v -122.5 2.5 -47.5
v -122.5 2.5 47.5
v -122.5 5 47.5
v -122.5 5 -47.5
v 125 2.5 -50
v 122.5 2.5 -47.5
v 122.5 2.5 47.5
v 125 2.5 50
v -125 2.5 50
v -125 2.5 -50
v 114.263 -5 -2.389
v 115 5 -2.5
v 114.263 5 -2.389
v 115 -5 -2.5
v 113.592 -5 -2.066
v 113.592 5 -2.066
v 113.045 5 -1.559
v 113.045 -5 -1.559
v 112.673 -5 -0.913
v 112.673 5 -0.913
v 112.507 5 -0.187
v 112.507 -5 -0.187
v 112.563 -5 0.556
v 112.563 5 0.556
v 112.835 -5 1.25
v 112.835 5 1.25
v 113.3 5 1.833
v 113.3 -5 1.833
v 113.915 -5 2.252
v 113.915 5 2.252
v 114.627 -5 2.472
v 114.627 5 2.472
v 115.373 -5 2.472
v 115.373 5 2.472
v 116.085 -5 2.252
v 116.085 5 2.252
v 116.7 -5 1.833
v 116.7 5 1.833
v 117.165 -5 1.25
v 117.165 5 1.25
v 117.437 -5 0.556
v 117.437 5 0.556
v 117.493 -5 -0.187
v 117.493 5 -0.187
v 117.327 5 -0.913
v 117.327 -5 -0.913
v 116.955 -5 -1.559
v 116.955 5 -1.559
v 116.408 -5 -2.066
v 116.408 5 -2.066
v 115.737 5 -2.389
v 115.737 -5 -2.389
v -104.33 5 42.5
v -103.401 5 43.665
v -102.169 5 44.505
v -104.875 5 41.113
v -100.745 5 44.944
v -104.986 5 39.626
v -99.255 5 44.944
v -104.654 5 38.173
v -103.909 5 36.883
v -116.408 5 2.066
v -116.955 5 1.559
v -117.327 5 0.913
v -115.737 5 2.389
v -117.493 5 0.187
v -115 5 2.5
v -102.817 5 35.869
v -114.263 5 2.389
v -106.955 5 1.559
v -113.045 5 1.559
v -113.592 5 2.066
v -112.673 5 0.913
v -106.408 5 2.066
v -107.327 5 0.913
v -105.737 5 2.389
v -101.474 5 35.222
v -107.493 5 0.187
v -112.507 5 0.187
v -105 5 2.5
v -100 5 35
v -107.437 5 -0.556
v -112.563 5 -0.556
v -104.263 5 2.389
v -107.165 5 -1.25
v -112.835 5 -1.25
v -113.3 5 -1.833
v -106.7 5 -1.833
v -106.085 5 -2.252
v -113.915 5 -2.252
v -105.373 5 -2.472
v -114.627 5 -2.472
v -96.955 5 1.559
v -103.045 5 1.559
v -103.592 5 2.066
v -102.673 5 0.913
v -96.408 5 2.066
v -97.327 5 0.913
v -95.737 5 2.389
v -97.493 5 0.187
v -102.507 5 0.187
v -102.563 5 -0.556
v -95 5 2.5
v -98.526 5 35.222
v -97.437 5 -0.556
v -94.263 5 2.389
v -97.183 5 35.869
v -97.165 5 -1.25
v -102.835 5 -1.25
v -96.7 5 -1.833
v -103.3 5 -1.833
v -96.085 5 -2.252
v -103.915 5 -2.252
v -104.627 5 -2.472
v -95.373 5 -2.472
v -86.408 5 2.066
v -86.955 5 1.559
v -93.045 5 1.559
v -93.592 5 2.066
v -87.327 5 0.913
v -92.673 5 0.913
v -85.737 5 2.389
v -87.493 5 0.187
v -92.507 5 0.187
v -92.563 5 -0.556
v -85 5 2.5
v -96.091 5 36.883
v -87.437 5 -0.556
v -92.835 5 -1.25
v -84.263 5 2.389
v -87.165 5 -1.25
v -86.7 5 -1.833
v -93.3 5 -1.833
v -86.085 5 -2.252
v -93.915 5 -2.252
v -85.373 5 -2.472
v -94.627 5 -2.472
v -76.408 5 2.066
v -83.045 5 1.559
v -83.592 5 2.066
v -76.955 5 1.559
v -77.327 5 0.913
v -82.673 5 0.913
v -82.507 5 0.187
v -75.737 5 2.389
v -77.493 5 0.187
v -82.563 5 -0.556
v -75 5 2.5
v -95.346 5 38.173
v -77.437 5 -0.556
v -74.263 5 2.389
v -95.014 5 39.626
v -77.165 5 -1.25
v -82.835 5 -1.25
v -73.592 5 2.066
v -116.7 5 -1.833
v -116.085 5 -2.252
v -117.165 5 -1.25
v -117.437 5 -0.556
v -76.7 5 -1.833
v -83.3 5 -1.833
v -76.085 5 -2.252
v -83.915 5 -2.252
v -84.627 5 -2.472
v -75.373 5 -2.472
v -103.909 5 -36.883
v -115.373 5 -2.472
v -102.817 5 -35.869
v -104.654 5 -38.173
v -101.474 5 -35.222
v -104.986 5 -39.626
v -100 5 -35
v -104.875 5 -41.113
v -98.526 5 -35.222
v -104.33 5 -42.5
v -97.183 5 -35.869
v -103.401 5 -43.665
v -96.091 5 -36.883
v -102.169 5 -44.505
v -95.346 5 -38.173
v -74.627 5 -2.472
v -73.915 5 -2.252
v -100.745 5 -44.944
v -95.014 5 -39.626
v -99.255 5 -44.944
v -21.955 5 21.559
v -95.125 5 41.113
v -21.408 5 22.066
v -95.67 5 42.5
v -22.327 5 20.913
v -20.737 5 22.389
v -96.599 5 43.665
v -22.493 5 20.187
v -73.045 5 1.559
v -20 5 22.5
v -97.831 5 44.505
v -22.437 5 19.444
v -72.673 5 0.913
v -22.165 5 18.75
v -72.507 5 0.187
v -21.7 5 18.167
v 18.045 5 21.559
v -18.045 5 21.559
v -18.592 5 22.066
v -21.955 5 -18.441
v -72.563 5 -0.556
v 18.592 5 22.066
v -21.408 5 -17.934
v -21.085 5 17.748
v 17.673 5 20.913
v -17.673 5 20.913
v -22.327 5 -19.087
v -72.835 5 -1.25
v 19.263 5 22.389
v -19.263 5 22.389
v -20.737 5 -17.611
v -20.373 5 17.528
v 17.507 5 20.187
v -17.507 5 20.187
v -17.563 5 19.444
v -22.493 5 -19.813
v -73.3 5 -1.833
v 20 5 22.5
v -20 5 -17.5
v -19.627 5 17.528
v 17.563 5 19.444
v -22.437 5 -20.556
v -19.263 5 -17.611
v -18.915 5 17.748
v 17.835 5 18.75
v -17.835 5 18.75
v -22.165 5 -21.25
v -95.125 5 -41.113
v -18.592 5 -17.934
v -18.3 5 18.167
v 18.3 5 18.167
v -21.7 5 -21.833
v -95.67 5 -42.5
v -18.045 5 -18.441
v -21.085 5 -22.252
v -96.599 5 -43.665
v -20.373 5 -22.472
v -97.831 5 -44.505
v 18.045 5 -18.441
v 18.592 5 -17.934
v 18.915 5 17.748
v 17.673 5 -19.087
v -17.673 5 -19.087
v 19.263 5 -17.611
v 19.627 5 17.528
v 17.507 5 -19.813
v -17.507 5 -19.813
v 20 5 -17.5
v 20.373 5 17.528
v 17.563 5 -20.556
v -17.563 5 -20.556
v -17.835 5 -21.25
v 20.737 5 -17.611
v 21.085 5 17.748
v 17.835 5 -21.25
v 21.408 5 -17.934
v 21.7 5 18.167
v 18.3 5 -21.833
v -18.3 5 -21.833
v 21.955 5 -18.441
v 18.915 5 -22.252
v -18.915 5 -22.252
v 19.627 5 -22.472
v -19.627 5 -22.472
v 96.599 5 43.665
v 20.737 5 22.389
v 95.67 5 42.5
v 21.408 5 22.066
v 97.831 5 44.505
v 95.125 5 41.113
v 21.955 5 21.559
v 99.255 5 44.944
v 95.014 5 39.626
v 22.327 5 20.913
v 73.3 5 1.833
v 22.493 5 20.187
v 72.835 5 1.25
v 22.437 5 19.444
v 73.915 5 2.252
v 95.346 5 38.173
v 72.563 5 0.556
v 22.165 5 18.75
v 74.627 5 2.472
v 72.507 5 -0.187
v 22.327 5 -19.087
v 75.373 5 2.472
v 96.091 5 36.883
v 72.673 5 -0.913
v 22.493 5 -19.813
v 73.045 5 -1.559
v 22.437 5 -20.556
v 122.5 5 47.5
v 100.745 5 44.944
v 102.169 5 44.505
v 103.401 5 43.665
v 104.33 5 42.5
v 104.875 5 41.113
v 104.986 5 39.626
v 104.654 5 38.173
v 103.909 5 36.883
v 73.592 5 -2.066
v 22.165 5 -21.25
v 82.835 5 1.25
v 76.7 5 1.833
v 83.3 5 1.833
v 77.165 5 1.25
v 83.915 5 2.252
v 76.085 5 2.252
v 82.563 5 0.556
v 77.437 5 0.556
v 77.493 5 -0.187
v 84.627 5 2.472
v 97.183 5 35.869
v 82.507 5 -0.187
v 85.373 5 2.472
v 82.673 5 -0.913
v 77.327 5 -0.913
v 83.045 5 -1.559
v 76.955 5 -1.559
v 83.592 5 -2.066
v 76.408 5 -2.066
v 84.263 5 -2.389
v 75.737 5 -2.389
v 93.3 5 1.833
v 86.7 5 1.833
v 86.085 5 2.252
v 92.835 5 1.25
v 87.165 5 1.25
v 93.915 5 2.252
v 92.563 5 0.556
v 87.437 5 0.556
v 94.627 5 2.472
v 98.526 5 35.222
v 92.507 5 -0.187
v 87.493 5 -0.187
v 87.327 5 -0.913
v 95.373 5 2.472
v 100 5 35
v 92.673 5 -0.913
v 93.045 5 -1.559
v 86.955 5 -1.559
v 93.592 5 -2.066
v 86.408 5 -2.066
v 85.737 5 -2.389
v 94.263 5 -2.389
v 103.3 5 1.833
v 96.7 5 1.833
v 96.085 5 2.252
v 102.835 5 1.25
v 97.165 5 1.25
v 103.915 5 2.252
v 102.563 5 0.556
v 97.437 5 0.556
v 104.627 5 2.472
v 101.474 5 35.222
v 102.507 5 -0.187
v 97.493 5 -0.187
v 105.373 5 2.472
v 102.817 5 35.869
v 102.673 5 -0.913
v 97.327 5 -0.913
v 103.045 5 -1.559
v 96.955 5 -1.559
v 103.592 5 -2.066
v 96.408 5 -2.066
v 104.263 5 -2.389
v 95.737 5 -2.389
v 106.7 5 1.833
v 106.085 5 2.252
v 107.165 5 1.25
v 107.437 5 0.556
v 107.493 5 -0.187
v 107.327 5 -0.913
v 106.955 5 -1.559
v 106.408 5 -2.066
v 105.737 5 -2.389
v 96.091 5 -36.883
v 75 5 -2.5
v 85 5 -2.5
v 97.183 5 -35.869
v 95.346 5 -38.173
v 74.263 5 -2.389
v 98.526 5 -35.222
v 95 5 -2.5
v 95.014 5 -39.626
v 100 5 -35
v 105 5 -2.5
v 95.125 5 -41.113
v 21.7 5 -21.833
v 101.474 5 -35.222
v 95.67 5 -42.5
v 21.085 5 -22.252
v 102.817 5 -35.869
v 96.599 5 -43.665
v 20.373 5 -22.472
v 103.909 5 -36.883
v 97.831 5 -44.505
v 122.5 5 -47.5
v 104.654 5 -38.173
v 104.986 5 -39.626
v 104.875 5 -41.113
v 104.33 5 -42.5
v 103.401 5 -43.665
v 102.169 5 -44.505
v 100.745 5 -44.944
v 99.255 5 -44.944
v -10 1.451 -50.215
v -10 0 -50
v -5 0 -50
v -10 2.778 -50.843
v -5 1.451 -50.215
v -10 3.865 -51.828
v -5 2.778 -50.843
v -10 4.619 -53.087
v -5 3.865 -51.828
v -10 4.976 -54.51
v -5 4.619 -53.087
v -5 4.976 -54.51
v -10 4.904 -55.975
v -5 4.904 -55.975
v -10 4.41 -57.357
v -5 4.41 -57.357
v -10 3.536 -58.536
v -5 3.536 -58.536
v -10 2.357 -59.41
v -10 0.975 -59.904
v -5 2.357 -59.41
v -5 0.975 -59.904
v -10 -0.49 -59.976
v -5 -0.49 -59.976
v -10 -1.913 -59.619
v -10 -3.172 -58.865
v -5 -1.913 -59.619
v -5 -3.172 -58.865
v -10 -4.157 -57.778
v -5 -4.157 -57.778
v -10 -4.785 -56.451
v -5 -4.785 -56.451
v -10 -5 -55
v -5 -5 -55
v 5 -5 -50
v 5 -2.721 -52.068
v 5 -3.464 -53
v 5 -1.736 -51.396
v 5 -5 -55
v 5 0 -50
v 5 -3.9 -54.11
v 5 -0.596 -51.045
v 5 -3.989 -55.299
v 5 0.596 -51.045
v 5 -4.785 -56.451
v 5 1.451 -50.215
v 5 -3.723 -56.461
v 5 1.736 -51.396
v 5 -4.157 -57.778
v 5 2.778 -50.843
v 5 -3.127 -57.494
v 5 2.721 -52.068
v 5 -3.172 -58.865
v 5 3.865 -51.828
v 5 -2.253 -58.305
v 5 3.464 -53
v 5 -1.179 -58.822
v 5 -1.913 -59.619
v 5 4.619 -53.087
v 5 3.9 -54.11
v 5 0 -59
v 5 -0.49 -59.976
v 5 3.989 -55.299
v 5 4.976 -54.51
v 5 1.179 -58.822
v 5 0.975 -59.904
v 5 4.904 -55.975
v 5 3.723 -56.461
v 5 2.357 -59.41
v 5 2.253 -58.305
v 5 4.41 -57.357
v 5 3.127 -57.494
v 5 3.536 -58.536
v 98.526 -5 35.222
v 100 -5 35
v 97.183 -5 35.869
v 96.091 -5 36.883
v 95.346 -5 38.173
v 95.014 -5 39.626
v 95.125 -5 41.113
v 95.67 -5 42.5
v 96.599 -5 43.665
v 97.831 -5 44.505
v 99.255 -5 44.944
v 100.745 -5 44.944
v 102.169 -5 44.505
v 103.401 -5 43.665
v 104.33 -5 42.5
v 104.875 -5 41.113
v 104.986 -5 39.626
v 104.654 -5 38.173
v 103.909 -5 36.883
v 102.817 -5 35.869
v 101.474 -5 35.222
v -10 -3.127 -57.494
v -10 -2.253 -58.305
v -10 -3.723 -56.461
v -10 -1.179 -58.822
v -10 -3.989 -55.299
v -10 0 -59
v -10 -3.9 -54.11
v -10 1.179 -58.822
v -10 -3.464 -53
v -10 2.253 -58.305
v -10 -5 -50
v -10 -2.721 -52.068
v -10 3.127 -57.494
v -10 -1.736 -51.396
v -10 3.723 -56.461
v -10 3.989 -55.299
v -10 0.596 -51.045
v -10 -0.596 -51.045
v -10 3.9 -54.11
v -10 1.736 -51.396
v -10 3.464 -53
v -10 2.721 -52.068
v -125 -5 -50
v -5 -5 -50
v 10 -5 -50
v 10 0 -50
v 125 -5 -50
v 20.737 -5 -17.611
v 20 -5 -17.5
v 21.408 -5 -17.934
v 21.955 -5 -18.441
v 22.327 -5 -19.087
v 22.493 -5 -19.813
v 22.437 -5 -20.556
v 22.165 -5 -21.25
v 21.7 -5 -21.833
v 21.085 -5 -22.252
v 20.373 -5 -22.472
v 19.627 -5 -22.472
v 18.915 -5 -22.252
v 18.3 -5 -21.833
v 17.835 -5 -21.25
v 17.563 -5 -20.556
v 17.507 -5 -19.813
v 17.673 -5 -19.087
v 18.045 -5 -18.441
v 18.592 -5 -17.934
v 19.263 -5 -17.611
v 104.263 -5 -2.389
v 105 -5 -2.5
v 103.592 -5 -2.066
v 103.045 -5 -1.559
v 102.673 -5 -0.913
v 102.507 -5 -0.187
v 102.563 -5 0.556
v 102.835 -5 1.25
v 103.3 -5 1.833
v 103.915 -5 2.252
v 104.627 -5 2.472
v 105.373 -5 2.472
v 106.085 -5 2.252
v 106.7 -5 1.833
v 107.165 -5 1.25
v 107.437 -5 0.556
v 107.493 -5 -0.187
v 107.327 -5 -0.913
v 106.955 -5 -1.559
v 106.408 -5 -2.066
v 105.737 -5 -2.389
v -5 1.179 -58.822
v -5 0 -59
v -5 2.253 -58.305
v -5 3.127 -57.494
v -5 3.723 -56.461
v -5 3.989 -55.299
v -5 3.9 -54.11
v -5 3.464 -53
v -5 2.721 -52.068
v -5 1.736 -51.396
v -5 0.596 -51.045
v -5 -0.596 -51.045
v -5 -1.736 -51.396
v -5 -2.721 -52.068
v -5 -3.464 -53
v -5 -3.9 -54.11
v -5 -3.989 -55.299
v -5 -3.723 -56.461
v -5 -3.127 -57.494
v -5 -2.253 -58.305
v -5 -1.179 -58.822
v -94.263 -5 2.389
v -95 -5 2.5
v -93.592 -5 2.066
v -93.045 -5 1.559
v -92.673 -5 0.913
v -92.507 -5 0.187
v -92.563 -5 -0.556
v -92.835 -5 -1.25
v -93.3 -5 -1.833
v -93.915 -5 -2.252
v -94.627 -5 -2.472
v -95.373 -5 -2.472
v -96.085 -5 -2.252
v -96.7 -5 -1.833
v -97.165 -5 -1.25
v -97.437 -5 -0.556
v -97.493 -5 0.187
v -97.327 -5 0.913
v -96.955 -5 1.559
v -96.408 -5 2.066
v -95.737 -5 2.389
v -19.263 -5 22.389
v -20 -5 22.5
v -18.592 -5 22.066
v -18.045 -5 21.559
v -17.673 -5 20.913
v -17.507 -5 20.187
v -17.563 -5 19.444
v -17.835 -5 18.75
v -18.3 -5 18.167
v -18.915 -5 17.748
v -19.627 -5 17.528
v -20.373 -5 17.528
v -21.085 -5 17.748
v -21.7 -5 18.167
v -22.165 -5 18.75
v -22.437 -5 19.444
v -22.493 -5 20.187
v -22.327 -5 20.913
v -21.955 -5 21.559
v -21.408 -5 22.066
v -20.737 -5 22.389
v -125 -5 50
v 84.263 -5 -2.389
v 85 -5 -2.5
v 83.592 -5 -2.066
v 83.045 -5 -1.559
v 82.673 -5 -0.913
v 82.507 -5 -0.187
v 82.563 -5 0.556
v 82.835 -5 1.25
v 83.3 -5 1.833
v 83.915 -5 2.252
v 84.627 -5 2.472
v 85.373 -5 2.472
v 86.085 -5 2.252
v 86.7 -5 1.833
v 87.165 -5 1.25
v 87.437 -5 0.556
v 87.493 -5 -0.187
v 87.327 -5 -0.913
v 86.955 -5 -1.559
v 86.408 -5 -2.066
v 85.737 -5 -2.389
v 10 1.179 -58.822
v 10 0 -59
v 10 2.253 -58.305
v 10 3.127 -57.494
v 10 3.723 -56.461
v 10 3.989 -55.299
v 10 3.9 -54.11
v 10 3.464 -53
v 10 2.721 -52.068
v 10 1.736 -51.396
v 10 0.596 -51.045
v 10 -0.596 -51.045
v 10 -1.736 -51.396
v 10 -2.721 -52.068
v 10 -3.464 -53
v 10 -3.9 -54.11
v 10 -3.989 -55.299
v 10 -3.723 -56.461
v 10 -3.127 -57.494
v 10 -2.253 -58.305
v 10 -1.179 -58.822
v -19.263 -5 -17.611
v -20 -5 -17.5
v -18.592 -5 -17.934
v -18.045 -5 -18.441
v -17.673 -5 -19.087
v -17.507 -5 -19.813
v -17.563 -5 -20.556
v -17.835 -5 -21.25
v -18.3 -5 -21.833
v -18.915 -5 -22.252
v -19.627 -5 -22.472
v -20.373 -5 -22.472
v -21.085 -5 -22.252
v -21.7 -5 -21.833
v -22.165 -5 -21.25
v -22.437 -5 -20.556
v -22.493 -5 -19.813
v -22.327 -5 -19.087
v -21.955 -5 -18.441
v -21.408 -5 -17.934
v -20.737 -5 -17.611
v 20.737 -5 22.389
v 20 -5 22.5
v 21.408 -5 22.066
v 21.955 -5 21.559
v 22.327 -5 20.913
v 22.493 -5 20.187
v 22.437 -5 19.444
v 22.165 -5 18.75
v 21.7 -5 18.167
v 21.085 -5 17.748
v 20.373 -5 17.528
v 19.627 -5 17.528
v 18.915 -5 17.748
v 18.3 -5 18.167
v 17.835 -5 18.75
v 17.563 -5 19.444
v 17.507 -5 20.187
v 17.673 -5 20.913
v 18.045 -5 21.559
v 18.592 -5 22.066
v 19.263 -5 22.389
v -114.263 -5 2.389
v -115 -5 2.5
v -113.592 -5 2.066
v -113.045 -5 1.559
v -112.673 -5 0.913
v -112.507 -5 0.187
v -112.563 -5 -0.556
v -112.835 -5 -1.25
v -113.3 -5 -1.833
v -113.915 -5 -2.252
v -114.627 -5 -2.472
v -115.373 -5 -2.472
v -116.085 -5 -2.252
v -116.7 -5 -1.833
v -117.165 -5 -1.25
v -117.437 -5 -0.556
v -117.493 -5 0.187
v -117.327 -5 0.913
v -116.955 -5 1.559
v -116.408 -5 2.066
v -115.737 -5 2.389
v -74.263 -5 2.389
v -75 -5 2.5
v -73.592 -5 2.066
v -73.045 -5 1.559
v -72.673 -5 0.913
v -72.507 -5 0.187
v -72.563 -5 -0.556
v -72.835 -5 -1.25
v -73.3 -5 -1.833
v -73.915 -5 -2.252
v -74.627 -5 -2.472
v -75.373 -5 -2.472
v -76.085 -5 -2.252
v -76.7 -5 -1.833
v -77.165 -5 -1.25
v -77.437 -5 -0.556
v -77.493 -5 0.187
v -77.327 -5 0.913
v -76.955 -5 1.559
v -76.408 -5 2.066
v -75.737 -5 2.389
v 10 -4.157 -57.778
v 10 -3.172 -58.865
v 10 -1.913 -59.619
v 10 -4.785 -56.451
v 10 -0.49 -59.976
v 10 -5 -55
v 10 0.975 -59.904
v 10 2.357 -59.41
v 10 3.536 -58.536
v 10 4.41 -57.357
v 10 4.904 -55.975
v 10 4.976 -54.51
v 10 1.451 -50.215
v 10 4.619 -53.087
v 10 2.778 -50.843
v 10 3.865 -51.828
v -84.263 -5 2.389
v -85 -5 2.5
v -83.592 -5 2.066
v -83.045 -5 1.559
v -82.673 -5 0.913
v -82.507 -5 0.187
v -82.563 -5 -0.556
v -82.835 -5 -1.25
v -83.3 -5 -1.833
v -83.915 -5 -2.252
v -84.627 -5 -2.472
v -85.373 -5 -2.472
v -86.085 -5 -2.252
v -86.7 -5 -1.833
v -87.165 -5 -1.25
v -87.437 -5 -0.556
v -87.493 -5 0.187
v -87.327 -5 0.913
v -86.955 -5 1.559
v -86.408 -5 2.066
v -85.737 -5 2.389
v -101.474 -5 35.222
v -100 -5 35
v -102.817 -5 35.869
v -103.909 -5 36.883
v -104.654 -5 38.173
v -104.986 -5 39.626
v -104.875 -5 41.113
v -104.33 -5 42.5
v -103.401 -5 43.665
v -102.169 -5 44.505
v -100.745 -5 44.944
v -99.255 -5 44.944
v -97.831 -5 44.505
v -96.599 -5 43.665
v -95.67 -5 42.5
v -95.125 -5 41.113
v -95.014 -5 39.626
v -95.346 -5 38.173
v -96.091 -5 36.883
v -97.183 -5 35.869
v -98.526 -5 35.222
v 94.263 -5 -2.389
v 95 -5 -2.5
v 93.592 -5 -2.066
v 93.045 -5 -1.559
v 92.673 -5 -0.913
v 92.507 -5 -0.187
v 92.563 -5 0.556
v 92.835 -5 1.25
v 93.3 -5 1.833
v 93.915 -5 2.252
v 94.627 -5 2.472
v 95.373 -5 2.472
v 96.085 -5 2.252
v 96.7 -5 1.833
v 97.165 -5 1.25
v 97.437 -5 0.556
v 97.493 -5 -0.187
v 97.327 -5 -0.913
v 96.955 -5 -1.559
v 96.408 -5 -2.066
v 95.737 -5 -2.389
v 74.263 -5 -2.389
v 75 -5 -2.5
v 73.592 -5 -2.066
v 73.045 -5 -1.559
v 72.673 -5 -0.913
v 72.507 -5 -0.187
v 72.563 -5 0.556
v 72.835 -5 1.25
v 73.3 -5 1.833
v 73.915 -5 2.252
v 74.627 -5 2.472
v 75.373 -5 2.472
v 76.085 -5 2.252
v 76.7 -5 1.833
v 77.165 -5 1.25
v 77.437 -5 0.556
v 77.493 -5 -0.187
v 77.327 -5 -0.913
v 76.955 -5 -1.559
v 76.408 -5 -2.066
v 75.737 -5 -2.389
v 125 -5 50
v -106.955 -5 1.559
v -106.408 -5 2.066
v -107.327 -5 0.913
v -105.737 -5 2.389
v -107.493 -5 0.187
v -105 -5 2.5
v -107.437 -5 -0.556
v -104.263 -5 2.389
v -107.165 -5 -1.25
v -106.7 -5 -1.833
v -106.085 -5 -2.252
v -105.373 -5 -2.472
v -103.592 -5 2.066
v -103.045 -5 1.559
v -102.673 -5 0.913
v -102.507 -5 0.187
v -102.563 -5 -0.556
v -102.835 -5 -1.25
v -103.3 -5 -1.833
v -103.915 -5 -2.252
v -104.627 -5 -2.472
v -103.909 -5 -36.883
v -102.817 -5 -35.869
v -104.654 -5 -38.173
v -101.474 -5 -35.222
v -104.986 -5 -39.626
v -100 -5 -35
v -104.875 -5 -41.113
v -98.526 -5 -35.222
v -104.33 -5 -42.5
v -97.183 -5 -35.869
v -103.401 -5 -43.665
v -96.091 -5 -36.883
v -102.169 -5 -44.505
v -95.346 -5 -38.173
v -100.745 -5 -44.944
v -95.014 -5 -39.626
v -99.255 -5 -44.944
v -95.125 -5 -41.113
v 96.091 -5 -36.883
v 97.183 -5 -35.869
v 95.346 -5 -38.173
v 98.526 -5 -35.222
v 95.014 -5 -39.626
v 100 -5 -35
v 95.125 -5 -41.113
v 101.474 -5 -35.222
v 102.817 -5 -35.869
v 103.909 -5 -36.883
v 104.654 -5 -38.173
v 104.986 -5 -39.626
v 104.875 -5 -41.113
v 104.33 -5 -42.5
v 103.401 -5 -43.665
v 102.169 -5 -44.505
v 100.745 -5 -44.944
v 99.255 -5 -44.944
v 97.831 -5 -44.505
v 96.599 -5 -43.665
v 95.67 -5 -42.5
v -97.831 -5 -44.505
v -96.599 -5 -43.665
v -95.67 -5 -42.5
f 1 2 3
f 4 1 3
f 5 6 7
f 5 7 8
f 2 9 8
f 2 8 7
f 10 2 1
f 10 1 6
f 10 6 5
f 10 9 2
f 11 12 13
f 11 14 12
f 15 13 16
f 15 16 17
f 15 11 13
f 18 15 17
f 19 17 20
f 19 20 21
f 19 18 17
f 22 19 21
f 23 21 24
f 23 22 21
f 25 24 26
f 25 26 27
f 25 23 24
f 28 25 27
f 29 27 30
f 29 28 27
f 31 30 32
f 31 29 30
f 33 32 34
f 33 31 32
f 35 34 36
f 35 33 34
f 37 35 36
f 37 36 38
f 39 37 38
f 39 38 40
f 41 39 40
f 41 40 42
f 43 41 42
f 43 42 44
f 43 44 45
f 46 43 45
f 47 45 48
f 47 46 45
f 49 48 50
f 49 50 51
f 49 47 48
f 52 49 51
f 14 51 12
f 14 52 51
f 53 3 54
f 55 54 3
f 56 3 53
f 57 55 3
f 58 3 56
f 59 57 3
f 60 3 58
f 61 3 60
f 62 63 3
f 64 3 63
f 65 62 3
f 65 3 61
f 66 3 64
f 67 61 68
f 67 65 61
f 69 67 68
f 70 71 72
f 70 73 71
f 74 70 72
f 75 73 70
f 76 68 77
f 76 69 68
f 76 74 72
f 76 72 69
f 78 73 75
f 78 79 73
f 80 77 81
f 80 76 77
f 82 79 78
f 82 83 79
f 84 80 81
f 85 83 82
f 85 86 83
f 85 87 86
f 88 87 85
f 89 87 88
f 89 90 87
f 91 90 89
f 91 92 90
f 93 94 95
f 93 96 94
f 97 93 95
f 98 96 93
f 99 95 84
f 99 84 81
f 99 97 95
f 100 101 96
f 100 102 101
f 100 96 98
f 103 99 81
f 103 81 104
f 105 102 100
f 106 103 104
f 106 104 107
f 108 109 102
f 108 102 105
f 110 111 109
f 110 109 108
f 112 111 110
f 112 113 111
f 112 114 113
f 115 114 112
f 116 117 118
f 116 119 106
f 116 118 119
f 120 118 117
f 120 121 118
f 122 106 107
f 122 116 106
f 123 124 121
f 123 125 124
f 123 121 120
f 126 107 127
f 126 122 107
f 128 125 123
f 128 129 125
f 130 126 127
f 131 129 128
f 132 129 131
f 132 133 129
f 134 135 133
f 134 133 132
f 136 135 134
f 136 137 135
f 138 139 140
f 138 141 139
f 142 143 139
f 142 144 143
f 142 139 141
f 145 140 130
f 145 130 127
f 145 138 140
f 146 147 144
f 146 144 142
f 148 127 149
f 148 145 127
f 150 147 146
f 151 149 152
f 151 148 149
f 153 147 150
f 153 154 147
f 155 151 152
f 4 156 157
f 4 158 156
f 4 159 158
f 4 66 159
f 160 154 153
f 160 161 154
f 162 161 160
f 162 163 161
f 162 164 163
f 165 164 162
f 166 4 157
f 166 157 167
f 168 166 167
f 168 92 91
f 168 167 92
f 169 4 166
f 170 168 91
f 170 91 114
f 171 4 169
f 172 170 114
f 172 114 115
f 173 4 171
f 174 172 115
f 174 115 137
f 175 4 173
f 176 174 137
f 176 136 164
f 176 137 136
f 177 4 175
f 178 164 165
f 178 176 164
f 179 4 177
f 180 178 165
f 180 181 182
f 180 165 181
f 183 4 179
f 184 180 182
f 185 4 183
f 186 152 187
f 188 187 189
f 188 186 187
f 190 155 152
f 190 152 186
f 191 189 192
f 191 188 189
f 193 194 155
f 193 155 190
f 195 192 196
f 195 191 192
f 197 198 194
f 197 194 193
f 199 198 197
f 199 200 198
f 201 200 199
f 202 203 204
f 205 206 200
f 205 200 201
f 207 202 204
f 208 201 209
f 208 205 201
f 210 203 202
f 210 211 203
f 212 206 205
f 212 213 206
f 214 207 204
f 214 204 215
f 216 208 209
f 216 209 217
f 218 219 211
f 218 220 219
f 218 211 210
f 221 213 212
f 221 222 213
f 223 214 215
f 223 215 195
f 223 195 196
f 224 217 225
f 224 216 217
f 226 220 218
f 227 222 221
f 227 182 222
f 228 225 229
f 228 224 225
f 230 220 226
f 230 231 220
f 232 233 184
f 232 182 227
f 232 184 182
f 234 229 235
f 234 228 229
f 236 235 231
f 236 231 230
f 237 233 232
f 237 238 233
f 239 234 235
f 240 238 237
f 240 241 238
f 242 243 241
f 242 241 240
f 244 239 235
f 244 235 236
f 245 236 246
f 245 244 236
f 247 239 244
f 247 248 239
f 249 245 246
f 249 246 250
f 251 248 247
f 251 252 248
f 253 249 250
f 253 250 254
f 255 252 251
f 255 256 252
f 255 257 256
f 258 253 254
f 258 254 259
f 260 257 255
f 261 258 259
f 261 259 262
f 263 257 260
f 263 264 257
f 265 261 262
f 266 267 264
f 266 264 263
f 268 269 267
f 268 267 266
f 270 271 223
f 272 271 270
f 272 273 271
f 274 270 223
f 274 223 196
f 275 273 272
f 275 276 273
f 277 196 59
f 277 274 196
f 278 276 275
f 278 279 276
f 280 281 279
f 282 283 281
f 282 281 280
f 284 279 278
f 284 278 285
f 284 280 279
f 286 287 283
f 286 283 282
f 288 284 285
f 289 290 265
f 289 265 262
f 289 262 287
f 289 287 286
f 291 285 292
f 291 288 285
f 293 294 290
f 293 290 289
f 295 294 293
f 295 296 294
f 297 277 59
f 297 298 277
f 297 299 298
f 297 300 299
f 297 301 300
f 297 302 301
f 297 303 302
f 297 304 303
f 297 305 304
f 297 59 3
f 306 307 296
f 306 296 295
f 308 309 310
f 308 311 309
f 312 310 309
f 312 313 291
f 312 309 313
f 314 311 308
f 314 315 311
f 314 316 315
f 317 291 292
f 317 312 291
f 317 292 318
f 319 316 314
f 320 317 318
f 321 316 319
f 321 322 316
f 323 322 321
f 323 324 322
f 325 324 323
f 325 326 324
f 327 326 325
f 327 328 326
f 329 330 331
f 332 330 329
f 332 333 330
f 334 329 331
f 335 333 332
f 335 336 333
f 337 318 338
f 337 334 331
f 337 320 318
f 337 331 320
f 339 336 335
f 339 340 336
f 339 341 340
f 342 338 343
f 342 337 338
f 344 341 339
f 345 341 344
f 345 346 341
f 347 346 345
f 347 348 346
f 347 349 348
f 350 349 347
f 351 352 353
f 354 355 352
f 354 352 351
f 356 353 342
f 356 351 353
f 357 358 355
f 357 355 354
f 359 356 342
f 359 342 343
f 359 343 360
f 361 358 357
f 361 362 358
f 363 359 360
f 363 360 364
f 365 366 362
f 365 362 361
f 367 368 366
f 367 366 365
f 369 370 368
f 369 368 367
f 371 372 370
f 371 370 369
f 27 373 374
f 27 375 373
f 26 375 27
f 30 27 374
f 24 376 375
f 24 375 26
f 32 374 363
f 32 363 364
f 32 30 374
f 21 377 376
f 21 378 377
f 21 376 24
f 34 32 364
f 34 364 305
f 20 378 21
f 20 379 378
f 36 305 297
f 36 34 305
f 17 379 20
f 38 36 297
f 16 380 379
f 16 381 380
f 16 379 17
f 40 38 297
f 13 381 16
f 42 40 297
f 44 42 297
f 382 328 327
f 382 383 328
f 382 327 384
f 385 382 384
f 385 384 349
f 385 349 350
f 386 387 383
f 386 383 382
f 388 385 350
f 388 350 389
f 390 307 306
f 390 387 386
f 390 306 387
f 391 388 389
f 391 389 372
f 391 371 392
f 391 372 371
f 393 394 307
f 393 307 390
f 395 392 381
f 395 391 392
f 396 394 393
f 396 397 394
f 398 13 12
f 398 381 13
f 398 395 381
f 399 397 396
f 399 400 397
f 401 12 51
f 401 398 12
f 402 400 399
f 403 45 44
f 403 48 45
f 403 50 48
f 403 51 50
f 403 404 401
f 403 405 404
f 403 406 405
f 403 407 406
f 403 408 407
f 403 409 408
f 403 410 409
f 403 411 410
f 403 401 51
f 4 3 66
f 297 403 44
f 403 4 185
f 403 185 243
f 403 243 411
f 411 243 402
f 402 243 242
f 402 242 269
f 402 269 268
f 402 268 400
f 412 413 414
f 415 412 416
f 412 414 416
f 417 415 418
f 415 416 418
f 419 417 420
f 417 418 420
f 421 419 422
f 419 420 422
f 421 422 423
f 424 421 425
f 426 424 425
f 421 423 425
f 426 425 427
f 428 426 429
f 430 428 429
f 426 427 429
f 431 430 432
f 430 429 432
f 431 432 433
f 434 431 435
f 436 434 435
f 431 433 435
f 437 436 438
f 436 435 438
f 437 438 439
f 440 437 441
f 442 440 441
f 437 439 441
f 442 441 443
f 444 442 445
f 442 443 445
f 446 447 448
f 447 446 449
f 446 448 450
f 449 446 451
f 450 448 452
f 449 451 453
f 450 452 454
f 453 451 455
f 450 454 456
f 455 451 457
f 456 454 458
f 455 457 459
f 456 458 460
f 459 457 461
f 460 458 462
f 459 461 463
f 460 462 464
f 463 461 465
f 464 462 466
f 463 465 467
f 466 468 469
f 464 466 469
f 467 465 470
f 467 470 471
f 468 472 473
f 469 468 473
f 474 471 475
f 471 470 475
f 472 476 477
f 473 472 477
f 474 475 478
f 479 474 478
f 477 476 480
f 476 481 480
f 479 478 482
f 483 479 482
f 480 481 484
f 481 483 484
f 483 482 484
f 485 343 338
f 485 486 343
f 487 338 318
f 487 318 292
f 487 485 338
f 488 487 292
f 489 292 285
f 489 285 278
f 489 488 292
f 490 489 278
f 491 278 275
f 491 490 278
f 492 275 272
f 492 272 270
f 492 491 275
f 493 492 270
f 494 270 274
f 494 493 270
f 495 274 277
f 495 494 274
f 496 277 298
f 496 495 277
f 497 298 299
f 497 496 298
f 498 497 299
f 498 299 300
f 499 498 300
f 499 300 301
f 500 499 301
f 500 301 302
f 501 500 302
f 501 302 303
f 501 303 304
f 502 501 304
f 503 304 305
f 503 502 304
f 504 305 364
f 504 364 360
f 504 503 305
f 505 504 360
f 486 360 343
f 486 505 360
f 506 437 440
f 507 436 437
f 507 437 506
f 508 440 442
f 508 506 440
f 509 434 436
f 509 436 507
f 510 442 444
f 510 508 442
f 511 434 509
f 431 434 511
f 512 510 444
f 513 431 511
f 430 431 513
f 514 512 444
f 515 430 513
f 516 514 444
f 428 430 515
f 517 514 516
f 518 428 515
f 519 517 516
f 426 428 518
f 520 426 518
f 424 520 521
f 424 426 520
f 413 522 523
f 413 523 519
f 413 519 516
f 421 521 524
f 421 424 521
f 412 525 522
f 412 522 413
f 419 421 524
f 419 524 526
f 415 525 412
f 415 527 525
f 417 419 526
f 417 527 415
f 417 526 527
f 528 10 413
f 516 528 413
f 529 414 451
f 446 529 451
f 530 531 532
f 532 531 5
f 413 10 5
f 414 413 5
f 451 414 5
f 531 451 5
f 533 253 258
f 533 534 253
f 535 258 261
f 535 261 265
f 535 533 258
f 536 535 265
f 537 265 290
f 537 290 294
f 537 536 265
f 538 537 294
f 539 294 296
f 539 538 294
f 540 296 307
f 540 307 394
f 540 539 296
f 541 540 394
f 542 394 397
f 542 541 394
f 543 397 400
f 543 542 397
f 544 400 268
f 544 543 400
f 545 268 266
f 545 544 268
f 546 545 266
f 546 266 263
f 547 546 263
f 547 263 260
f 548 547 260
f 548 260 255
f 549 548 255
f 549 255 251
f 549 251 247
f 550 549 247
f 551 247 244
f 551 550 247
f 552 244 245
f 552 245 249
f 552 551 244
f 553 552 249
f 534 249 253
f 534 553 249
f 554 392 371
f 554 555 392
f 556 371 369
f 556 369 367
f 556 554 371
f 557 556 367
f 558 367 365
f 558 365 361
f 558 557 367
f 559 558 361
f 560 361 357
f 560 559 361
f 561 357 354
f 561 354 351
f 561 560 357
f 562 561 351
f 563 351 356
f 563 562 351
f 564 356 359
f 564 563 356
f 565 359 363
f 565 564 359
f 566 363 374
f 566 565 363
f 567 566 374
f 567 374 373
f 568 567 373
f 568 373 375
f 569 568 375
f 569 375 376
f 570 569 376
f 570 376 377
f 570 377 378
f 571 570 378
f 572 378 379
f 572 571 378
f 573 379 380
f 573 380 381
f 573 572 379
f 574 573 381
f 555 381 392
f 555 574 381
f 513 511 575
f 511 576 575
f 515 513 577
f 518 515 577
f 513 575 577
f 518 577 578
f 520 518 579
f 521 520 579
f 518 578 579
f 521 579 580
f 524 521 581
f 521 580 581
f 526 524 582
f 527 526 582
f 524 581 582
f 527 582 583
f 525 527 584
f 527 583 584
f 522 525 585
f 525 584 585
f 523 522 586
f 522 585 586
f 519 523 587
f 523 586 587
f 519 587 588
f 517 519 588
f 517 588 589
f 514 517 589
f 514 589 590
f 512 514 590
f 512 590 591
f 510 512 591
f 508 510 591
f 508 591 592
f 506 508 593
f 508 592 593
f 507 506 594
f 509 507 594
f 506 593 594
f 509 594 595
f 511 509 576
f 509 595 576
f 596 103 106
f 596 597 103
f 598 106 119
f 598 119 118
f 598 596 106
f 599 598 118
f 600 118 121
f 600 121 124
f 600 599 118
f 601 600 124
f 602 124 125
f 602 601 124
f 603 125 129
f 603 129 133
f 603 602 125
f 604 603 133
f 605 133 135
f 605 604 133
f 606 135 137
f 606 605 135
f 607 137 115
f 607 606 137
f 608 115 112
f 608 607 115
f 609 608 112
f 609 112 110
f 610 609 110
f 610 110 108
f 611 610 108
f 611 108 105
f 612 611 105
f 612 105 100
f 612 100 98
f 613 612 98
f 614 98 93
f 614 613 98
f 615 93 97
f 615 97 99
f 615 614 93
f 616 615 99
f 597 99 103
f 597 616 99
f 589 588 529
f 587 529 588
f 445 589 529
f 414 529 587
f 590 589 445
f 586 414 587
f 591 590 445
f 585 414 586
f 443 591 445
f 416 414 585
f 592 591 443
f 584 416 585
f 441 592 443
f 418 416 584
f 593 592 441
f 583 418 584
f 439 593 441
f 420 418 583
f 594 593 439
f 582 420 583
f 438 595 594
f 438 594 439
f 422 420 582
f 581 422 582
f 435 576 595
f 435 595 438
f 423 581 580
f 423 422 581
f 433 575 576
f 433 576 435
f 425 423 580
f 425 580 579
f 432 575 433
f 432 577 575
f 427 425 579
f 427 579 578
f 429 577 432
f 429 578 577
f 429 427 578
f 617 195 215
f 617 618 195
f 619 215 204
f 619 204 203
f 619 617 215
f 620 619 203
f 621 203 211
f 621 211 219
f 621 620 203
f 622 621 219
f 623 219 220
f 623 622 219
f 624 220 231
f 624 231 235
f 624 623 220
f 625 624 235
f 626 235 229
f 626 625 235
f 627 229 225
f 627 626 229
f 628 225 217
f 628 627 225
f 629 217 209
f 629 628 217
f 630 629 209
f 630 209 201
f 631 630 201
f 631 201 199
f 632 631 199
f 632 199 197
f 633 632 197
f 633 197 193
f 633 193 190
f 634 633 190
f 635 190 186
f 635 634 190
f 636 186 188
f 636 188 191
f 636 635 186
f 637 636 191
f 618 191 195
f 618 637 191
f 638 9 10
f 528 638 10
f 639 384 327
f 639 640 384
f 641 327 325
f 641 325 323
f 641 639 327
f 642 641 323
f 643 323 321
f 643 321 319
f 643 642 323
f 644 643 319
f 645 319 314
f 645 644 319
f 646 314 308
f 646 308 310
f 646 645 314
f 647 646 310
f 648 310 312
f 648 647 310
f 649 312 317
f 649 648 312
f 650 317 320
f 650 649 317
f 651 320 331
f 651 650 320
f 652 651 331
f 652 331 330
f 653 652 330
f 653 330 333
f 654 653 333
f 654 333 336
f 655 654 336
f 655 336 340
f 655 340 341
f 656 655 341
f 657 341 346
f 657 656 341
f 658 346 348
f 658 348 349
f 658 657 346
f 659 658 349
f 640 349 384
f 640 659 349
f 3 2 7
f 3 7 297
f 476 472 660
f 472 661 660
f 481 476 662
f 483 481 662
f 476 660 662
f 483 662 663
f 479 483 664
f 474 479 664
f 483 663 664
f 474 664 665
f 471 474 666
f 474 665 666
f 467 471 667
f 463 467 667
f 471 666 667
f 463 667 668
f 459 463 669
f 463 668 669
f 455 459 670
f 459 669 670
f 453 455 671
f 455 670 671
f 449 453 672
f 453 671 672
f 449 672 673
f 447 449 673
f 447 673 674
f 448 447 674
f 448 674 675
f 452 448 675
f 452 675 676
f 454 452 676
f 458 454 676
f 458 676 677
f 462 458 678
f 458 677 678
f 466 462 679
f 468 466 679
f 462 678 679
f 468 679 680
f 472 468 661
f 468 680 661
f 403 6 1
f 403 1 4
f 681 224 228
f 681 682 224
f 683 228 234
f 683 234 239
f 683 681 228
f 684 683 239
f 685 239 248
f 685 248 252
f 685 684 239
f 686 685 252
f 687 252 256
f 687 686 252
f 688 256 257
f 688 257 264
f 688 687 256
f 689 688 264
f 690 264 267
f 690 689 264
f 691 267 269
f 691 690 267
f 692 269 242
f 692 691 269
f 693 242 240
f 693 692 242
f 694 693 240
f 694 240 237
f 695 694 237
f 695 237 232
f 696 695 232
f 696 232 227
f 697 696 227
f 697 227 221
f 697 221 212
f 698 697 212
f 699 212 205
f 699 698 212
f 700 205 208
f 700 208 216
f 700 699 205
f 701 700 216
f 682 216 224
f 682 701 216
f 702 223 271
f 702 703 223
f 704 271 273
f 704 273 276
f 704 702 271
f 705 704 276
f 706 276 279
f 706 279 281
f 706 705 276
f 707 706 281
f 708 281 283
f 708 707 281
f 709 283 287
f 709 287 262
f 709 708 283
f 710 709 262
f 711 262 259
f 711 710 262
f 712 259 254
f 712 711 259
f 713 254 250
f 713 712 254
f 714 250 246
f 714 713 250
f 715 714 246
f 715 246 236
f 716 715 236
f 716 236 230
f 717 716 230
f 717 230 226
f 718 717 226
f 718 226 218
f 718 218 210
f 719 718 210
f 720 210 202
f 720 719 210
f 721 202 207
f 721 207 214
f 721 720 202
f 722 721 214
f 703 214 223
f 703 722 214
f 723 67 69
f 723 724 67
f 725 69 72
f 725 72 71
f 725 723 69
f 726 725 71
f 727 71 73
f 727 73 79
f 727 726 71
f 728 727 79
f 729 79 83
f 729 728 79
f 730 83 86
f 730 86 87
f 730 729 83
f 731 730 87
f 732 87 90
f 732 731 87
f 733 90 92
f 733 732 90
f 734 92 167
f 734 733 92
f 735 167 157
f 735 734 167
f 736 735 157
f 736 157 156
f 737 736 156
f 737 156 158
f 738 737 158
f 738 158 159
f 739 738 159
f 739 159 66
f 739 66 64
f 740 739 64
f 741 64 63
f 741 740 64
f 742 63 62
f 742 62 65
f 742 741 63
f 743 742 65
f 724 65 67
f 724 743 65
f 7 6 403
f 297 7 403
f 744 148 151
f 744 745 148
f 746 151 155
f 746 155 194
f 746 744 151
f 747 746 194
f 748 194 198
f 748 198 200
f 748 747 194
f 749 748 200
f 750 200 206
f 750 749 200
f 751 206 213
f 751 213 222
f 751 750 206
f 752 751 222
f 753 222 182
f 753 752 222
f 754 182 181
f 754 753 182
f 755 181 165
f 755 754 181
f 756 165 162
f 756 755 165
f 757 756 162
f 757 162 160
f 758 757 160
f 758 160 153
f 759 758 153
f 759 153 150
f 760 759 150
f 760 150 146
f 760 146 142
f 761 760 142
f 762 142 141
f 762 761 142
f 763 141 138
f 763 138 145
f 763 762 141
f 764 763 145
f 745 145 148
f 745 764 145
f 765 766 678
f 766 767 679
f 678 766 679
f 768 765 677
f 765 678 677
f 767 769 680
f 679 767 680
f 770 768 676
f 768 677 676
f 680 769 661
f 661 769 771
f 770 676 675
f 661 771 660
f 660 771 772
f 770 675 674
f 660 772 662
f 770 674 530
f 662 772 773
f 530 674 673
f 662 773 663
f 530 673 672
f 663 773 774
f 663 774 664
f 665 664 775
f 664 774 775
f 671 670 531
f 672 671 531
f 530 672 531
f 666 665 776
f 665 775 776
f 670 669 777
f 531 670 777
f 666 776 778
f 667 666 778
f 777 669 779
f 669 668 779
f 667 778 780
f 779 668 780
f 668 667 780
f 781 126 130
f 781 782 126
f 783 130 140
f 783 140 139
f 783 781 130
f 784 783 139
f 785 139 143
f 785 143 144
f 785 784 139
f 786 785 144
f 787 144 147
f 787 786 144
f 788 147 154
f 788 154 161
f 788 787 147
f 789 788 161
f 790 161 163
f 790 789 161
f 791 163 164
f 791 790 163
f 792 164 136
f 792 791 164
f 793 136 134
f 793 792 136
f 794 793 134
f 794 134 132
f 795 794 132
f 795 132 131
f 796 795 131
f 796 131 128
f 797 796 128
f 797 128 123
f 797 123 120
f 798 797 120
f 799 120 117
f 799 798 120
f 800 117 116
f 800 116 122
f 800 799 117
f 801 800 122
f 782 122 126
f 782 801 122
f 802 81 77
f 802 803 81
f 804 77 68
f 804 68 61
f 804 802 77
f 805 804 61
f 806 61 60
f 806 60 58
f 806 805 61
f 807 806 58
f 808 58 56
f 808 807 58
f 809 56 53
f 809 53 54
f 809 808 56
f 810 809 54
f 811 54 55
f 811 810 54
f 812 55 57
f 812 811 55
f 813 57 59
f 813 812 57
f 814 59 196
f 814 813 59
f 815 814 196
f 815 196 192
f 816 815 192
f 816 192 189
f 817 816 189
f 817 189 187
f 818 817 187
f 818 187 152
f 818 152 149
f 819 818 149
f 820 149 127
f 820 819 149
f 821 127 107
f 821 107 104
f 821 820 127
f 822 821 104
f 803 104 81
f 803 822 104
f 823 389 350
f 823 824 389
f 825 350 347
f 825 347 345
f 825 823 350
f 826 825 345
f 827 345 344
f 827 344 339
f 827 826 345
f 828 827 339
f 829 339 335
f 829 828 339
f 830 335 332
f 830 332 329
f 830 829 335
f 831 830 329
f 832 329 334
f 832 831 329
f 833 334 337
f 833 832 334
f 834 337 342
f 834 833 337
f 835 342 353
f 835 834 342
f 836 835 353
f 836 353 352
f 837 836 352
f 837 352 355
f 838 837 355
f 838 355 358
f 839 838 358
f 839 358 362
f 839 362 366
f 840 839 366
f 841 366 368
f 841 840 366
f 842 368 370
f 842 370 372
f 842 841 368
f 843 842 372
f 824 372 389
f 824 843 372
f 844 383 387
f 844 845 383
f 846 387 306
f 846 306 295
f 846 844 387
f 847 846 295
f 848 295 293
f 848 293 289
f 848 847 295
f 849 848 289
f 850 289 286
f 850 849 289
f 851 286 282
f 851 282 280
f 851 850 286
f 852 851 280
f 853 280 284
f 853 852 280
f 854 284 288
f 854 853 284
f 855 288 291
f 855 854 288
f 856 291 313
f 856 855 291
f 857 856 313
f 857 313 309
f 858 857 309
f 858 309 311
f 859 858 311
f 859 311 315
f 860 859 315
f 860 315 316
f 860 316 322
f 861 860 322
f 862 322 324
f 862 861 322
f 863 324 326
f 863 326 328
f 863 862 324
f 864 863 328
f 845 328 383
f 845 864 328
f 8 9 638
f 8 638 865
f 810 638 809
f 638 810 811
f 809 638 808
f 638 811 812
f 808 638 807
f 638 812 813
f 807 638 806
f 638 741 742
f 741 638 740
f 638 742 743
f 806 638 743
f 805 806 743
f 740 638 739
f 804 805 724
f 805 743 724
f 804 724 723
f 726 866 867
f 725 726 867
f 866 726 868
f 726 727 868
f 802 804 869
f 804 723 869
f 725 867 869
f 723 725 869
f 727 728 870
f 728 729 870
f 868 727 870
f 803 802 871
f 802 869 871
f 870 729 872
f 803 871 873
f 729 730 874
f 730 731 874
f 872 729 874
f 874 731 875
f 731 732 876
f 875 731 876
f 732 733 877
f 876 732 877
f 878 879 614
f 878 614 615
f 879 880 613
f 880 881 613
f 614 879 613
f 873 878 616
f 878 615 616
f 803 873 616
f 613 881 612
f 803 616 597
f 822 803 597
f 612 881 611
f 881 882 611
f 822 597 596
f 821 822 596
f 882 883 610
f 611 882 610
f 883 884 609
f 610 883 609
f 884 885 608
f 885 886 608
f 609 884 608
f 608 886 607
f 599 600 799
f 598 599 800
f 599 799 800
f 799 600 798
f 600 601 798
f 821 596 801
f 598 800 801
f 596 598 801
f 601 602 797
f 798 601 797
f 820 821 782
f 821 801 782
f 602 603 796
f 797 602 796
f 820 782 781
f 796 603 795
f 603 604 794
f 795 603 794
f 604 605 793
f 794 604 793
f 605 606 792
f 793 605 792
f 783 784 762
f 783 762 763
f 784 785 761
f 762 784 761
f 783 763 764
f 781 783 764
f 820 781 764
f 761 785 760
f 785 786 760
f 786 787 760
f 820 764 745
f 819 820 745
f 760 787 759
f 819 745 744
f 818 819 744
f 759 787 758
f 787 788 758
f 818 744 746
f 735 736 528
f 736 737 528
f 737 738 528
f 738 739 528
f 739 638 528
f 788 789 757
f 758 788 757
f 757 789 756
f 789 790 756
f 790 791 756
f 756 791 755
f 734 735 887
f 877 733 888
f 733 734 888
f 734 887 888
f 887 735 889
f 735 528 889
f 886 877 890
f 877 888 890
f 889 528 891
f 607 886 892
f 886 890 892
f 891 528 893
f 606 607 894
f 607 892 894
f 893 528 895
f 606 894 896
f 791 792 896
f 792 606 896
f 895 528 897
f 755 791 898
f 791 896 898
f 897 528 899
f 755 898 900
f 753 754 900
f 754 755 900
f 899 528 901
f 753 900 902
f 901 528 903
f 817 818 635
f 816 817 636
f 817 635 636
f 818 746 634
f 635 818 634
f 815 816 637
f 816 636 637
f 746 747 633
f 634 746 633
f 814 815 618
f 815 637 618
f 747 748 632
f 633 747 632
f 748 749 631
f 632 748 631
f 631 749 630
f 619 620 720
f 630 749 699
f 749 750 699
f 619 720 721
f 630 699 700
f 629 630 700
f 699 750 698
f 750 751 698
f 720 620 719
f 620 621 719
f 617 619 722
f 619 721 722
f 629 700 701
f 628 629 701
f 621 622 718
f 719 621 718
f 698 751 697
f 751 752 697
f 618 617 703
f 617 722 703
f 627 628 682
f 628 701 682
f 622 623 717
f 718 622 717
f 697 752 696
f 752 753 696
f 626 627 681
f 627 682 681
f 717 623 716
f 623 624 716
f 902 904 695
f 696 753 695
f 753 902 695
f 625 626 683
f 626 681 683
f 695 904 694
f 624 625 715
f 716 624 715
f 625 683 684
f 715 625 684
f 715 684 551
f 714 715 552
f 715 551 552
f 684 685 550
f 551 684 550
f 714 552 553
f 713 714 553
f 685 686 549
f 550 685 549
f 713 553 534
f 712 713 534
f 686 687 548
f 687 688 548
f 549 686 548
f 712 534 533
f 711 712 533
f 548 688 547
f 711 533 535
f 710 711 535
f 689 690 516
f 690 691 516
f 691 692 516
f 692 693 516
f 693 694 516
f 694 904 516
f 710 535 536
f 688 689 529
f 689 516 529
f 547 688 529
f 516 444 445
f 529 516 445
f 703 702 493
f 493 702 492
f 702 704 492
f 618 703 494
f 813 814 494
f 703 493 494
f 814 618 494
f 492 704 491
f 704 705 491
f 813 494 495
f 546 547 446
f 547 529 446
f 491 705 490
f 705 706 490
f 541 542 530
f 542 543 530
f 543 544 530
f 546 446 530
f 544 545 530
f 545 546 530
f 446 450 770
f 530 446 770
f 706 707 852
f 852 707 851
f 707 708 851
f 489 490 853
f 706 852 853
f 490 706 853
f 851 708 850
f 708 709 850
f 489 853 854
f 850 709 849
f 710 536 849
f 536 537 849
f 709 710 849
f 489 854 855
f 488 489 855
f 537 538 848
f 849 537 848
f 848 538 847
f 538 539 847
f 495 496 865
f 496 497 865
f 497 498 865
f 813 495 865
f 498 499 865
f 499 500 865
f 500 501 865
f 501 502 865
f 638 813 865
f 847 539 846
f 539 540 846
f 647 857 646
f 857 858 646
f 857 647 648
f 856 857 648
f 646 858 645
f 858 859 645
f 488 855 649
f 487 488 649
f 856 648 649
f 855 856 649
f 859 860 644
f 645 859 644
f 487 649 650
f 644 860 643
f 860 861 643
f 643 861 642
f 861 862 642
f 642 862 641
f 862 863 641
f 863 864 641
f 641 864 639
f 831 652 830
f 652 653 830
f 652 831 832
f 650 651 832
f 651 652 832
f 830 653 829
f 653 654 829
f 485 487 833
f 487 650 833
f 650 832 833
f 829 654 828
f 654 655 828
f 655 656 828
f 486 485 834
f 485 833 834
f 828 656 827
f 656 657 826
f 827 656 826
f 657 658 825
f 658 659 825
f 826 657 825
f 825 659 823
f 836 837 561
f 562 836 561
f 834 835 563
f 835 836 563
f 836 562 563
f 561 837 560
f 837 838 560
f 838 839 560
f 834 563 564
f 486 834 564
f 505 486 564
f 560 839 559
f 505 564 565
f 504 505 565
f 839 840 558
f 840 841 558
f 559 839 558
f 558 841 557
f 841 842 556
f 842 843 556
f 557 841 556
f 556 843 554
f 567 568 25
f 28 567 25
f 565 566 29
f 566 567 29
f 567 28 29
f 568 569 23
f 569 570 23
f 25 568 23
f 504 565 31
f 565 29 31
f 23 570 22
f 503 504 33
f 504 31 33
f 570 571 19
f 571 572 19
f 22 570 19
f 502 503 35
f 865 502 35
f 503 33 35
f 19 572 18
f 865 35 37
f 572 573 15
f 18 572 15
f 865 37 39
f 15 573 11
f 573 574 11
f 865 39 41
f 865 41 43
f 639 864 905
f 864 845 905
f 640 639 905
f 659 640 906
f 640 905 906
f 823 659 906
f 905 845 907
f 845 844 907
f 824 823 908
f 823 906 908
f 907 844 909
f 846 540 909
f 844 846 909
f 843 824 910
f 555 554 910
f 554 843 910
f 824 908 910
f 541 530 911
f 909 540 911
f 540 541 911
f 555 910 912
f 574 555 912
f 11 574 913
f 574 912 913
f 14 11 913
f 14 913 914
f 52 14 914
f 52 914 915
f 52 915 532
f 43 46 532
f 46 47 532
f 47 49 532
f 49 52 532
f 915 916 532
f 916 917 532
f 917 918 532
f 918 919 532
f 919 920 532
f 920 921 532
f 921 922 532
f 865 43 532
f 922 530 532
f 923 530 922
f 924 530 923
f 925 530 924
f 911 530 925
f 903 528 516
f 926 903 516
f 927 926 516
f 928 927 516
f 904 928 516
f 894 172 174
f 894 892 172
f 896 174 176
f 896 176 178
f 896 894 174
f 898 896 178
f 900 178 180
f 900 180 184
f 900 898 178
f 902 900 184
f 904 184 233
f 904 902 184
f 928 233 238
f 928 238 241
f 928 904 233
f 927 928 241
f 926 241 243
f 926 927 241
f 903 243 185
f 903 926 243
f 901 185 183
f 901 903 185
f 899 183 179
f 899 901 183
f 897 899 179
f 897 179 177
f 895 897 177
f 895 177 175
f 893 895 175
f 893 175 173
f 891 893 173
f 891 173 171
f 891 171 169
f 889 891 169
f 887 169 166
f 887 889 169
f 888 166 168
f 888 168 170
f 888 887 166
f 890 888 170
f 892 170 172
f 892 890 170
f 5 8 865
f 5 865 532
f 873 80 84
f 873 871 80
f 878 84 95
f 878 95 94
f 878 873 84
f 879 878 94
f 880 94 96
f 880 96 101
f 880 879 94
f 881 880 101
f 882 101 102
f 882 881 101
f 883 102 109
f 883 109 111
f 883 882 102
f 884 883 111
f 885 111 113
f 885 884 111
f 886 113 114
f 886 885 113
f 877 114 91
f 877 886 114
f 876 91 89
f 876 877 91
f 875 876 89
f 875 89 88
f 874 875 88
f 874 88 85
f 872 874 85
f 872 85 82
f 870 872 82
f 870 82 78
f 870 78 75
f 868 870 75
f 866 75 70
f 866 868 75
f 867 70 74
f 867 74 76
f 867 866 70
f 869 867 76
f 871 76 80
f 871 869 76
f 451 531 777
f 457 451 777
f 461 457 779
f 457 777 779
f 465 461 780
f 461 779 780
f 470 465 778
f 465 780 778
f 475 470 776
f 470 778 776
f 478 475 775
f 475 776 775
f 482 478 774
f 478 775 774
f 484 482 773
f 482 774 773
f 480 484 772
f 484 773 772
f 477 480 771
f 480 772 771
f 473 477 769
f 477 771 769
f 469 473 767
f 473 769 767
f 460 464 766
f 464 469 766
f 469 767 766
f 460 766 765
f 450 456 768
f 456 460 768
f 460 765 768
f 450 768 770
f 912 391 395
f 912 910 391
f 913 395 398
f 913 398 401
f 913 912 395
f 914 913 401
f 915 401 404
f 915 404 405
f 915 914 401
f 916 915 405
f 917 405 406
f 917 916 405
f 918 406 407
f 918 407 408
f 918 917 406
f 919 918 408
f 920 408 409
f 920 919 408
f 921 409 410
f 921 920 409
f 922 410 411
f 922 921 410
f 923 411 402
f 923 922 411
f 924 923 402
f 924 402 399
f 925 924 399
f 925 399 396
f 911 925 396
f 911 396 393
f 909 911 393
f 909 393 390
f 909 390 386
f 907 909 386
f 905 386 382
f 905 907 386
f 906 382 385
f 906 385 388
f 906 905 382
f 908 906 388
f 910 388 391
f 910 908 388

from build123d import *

# Parameters (mm, degrees)
SKETCH1_W           = 250
SKETCH1_H           = 100
SKETCH1_R           = 5
SKETCH1_R_2         = 2.5
BOSS_EXTRUDE1_DEPTH = 5
BOSS_EXTRUDE2_DEPTH = 10
CUT_EXTRUDE1_DEPTH  = 5
SKETCH4_R           = 4
CUT_EXTRUDE2_DEPTH  = 44.5
SKETCH5_W           = 5
SKETCH5_H           = 5
SKETCH5_W_2         = 2.5
CUT_EXTRUDE3_DEPTH  = 290.5
SKETCH6_W           = 5
SKETCH6_H           = 5
CUT_EXTRUDE4_DEPTH  = 290.5


with BuildPart() as part:
    # Sketch1 → Boss-Extrude1 (new, symmetric)
    with BuildSketch(Plane(origin=(0, 0, 0), x_dir=(1, 0, 0), z_dir=(0, 1, 0))):
        Rectangle(SKETCH1_W, SKETCH1_H)
        with Locations(Location((-100, 40, 0), (0, 0, 270))):
            Circle(SKETCH1_R, mode=Mode.SUBTRACT)
        with Locations(Location((100, 40, 0), (0, 0, 270))):
            Circle(SKETCH1_R, mode=Mode.SUBTRACT)
        with Locations(Location((-100, -40, 0), (0, 0, 90))):
            Circle(SKETCH1_R, mode=Mode.SUBTRACT)
        with Locations(Location((100, -40, 0), (0, 0, 90))):
            Circle(SKETCH1_R, mode=Mode.SUBTRACT)
        with Locations(Location((-20, 20, 0), (0, 0, 270))):
            Circle(SKETCH1_R_2, mode=Mode.SUBTRACT)
        with Locations(Location((20, 20, 0), (0, 0, 270))):
            Circle(SKETCH1_R_2, mode=Mode.SUBTRACT)
        with Locations(Location((-20, -20, 0), (0, 0, 270))):
            Circle(SKETCH1_R_2, mode=Mode.SUBTRACT)
        with Locations(Location((20, -20, 0), (0, 0, 270))):
            Circle(SKETCH1_R_2, mode=Mode.SUBTRACT)
        with Locations(Location((-115, 0, 0), (0, 0, 270))):
            Circle(SKETCH1_R_2, mode=Mode.SUBTRACT)
        with Locations(Location((-105, 0, 0), (0, 0, 270))):
            Circle(SKETCH1_R_2, mode=Mode.SUBTRACT)
        with Locations(Location((-95, 0, 0), (0, 0, 270))):
            Circle(SKETCH1_R_2, mode=Mode.SUBTRACT)
        with Locations(Location((-85, 0, 0), (0, 0, 270))):
            Circle(SKETCH1_R_2, mode=Mode.SUBTRACT)
        with Locations(Location((-75, 0, 0), (0, 0, 270))):
            Circle(SKETCH1_R_2, mode=Mode.SUBTRACT)
        with Locations(Location((75, 0, 0), (0, 0, 90))):
            Circle(SKETCH1_R_2, mode=Mode.SUBTRACT)
        with Locations(Location((85, 0, 0), (0, 0, 90))):
            Circle(SKETCH1_R_2, mode=Mode.SUBTRACT)
        with Locations(Location((95, 0, 0), (0, 0, 90))):
            Circle(SKETCH1_R_2, mode=Mode.SUBTRACT)
        with Locations(Location((105, 0, 0), (0, 0, 90))):
            Circle(SKETCH1_R_2, mode=Mode.SUBTRACT)
        with Locations(Location((115, 0, 0), (0, 0, 90))):
            Circle(SKETCH1_R_2, mode=Mode.SUBTRACT)
    extrude(amount=BOSS_EXTRUDE1_DEPTH, both=True)

    # Sketch2 → Boss-Extrude2 (add, symmetric)
    with BuildSketch(Plane(origin=(0, 0, 0), x_dir=(0, 0, -1), z_dir=(1, 0, 0))):
        with BuildLine():
            Line((55, -5), (50, -5))
            Line((50, -5), (50, 0))
            ThreePointArc((50, 0), (58.535533906, 3.535533906), (55, -5))
        make_face()
    extrude(amount=BOSS_EXTRUDE2_DEPTH, both=True)

    # Sketch3 → Cut-Extrude1 (cut, symmetric)
    with BuildSketch(Plane(origin=(0, 0, 0), x_dir=(0, 0, -1), z_dir=(1, 0, 0))):
        Polygon((50, 5), (50, -6.022521845), (64.637798631, -7.270431104), (61.921760831, 9.282718187), align=None)
    extrude(amount=CUT_EXTRUDE1_DEPTH, both=True, mode=Mode.SUBTRACT)

    # Sketch4 → Cut-Extrude2 (cut, symmetric)
    with BuildSketch(Plane(origin=(10, 0, 0), x_dir=(0, 0, -1), z_dir=(1, 0, 0))):
        with Locations((55, 0)):
            Circle(SKETCH4_R)
    extrude(amount=CUT_EXTRUDE2_DEPTH, both=True, mode=Mode.SUBTRACT)

    # Sketch5 → Cut-Extrude3 (cut, symmetric)
    with BuildSketch(Plane(origin=(125, 0, 0), x_dir=(0, 0, -1), z_dir=(1, 0, 0))):
        with Locations((-50, 5)):
            Rectangle(SKETCH5_W, SKETCH5_H)
        with Locations((48.75, 5)):
            Rectangle(SKETCH5_W_2, SKETCH5_H)
    extrude(amount=CUT_EXTRUDE3_DEPTH, both=True, mode=Mode.SUBTRACT)

    # Sketch6 → Cut-Extrude4 (cut, symmetric)
    with BuildSketch(Plane.XY):
        with Locations((125, 5)):
            Rectangle(SKETCH6_W, SKETCH6_H)
        with Locations((-125, 5)):
            Rectangle(SKETCH6_W, SKETCH6_H)
    extrude(amount=CUT_EXTRUDE4_DEPTH, both=True, mode=Mode.SUBTRACT)


solid = part.part
